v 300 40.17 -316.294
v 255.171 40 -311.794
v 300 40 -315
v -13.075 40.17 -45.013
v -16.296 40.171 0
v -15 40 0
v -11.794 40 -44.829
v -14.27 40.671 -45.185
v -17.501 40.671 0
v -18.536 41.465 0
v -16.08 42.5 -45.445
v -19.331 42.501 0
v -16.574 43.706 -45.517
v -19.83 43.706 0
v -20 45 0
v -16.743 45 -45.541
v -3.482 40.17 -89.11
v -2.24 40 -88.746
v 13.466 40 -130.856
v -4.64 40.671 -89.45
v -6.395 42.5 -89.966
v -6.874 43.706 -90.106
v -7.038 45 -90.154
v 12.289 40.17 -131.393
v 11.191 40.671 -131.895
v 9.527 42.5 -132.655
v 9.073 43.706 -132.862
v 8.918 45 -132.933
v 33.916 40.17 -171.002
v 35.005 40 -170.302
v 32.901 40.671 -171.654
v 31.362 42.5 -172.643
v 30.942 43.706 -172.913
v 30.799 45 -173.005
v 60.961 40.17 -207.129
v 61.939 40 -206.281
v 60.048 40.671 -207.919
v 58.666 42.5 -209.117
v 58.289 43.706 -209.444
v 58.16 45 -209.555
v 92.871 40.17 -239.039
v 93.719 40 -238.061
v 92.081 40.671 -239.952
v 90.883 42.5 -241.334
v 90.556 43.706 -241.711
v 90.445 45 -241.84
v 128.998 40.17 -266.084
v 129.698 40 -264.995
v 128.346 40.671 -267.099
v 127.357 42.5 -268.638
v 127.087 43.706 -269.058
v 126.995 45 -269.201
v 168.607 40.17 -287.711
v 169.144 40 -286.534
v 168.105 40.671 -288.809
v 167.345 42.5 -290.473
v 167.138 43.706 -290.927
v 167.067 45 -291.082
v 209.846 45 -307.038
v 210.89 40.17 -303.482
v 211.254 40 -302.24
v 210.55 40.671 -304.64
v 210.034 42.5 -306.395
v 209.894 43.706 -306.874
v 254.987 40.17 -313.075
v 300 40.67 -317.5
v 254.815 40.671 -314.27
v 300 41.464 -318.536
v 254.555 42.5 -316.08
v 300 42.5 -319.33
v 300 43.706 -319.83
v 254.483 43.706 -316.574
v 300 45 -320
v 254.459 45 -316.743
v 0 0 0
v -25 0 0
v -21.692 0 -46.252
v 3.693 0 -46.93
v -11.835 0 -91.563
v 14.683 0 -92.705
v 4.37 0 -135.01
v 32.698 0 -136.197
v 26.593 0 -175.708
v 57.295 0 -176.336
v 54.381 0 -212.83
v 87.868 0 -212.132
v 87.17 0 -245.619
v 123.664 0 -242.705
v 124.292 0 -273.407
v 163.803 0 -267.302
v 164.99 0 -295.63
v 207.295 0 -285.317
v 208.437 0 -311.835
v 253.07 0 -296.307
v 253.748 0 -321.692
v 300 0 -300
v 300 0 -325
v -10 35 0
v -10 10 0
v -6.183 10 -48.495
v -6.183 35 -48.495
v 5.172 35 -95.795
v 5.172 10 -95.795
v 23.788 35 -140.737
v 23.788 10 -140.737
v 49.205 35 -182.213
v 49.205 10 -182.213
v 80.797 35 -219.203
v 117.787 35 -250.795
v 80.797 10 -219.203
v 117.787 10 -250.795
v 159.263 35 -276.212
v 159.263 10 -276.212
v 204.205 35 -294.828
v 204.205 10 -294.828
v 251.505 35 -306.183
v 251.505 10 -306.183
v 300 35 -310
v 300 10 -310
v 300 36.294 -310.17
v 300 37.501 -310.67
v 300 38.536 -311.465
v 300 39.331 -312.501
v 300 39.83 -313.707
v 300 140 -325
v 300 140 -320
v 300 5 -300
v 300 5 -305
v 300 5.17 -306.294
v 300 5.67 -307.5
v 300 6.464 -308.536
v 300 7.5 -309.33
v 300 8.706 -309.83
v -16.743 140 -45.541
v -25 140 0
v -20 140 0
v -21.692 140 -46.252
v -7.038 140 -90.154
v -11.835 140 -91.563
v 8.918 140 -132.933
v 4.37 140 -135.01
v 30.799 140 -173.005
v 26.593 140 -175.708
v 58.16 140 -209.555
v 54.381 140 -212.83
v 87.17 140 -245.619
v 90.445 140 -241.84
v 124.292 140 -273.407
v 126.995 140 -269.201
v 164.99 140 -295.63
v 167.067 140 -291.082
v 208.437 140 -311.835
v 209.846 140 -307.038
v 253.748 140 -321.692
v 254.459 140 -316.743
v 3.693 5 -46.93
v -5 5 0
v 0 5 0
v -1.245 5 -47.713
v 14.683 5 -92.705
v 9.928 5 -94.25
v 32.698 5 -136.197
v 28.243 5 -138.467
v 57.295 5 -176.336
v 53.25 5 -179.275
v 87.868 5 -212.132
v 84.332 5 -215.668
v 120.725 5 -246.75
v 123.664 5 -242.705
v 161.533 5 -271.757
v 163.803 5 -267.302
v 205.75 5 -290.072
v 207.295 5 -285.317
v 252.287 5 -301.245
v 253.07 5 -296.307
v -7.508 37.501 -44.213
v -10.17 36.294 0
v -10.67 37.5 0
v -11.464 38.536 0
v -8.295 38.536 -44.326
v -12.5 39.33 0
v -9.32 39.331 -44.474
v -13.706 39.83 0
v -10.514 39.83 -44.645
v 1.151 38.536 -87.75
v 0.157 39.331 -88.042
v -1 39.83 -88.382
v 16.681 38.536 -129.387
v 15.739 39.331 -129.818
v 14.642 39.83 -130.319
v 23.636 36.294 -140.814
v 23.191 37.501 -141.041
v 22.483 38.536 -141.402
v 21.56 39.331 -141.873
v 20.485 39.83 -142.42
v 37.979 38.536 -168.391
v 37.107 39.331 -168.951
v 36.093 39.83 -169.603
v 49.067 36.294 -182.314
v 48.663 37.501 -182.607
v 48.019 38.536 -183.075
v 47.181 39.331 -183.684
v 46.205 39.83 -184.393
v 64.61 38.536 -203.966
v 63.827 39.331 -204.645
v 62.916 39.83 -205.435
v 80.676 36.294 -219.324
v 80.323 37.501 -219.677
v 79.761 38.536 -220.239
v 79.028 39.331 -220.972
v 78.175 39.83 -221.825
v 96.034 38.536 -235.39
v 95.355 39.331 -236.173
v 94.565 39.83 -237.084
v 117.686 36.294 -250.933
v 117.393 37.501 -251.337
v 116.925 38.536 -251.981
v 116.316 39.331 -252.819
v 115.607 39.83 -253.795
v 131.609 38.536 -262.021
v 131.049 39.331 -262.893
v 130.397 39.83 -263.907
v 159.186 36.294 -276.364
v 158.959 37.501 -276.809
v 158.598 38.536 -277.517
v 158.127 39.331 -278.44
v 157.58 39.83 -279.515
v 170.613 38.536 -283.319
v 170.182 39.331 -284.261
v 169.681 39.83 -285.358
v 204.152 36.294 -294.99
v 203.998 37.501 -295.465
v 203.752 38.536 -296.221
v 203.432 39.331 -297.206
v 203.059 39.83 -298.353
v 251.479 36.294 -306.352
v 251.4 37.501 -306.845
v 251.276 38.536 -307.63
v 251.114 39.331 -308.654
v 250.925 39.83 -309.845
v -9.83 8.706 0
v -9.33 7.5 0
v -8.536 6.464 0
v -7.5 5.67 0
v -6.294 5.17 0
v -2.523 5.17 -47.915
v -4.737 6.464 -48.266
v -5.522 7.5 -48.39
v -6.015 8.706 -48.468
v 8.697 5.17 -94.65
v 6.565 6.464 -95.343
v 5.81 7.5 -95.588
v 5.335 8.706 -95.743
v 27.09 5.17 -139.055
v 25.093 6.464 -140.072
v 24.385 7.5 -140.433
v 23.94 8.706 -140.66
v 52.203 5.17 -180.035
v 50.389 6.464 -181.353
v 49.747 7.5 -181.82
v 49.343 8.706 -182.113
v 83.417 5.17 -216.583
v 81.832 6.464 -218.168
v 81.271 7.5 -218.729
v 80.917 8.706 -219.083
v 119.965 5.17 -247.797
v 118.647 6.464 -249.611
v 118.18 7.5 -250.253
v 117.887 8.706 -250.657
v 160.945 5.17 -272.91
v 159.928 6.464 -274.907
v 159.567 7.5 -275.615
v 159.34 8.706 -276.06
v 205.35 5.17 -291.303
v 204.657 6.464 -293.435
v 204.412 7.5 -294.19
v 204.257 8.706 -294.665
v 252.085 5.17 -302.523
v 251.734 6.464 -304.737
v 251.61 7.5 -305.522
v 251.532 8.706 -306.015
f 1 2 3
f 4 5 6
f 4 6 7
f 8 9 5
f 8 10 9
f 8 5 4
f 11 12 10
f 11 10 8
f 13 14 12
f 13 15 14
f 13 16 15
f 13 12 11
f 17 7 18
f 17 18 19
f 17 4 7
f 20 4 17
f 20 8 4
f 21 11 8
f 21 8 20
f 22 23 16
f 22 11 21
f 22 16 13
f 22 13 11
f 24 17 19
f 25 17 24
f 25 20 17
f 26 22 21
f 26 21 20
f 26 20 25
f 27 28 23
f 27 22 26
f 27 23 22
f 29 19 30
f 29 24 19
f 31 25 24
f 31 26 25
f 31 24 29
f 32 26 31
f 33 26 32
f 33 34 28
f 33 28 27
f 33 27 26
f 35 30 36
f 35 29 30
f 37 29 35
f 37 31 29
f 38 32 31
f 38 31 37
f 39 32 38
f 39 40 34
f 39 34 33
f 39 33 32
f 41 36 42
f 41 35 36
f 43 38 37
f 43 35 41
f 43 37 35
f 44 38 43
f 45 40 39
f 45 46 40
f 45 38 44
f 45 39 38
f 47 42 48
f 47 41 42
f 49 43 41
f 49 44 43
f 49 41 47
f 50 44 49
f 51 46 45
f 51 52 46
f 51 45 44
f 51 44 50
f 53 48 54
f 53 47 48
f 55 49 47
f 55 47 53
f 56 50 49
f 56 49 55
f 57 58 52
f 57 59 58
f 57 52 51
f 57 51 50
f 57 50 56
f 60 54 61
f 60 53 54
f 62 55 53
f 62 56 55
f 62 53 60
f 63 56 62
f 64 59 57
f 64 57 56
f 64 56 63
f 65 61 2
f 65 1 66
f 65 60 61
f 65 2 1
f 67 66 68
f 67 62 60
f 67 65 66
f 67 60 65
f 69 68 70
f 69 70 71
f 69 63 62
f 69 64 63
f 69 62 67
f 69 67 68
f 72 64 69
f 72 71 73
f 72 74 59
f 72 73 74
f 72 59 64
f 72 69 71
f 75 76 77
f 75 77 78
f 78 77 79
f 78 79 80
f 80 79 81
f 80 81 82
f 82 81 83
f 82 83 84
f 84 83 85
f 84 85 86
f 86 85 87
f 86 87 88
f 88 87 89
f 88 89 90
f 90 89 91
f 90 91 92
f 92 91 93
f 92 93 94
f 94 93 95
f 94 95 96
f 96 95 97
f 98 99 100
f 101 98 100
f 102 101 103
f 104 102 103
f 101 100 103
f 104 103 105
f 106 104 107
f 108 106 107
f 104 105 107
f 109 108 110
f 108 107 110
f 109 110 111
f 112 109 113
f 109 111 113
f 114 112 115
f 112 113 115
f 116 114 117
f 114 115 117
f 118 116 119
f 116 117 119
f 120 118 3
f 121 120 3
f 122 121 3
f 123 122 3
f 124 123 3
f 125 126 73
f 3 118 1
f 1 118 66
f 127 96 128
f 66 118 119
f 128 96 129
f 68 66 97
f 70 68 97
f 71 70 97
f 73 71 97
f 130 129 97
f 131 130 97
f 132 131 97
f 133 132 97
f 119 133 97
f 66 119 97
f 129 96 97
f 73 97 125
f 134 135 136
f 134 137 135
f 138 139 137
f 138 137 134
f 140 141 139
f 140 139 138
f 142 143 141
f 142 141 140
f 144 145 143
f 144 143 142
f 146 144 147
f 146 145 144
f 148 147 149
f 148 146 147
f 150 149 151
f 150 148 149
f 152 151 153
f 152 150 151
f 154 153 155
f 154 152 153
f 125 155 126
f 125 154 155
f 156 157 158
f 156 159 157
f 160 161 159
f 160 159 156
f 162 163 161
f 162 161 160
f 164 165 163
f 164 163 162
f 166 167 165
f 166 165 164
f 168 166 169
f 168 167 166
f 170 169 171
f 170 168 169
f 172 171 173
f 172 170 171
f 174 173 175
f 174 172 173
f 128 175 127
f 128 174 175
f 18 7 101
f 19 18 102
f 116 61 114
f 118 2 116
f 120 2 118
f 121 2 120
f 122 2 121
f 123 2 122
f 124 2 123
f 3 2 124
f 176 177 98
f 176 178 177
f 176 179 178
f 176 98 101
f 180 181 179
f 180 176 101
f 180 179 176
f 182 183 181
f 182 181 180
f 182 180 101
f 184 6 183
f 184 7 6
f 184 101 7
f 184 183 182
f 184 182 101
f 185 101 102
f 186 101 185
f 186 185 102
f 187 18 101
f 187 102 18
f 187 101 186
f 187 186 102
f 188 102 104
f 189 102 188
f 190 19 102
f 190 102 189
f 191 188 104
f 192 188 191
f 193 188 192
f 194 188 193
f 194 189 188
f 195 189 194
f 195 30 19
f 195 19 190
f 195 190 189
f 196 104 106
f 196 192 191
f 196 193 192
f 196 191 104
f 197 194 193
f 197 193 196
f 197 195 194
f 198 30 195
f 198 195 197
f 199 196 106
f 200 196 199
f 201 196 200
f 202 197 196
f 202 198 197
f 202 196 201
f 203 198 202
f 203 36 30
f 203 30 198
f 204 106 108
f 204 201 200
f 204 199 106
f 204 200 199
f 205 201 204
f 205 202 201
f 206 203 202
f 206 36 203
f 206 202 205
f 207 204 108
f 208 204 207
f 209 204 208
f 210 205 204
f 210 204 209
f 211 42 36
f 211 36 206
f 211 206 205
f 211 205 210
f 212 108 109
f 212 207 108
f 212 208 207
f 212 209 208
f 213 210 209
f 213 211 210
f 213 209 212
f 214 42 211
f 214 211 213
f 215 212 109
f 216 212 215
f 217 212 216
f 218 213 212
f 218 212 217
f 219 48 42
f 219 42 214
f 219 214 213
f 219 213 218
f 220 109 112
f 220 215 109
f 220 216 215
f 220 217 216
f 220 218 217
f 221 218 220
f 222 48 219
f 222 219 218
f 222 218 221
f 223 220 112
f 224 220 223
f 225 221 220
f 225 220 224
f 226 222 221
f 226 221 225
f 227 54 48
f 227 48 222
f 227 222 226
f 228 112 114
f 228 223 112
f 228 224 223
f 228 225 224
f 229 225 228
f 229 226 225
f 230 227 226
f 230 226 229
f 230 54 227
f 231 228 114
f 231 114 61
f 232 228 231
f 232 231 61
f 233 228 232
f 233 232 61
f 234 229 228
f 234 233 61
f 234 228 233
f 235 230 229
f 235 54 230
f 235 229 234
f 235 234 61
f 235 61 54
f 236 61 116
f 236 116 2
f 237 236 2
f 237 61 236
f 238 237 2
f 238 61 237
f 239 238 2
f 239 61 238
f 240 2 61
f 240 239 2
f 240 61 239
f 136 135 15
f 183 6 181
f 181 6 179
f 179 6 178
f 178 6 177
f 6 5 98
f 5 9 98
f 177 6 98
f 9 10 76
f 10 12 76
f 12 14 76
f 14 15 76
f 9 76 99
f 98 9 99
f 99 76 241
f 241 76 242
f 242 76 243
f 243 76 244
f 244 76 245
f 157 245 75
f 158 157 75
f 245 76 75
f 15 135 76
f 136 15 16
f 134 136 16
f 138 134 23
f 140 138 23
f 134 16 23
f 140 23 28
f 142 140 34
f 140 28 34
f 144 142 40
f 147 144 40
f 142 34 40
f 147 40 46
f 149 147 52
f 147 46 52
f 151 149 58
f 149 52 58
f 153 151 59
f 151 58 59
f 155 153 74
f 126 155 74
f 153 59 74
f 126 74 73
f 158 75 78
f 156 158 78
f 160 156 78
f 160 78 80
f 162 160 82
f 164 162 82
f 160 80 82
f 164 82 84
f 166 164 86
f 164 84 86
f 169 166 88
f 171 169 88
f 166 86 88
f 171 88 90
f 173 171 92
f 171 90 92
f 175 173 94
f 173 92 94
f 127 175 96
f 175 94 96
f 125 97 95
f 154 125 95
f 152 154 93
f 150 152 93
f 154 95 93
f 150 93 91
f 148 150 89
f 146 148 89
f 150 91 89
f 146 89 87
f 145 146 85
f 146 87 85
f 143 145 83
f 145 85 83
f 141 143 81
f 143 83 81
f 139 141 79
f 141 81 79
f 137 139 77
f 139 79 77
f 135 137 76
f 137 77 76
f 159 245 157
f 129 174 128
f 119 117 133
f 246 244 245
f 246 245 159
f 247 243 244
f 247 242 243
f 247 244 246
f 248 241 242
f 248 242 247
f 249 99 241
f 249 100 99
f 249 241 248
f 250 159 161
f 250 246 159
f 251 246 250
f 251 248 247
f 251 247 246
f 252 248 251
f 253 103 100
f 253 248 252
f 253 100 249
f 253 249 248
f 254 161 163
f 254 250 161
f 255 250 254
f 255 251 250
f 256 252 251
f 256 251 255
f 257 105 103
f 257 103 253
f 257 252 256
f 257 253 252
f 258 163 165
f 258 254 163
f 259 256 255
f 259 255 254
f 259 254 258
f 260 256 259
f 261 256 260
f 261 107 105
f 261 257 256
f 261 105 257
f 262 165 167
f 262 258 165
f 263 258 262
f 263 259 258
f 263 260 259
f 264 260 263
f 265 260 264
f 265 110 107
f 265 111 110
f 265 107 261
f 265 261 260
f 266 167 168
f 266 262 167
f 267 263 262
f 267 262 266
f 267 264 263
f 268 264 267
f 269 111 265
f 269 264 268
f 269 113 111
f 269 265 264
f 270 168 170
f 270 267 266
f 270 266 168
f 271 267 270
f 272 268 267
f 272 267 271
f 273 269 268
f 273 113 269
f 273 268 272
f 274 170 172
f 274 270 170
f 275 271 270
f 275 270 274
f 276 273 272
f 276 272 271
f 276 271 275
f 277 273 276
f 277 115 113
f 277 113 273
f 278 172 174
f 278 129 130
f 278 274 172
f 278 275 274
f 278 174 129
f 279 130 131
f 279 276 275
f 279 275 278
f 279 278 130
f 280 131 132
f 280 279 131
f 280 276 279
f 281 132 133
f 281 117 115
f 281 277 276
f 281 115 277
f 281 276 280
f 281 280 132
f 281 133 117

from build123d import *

# Parameters (mm, degrees)
BOTTOM_LEVEL_DEPTH = 5
MID_LEVEL_DEPTH    = 35
GUARD_RAIL_DEPTH   = 100
ROUNDING_R         = 5


with BuildPart() as part:
    # Sketch1 → Bottom level (new body)
    with BuildSketch(Plane(origin=(0, 0, 0), x_dir=(1, 0, 0), z_dir=(0, 1, 0))):
        with BuildLine():
            Line((300, 300), (300, 325))
            ThreePointArc((300, 325), (70.190296114, 229.809703886), (-25, 0))
            Line((-25, 0), (0, 0))
            ThreePointArc((0, 0), (87.867965644, 212.132034356), (300, 300))
        make_face()
    extrude(amount=BOTTOM_LEVEL_DEPTH)

    # Sketch2 → Mid level (add)
    with BuildSketch(Plane(origin=(0, 5, 0), x_dir=(1, 0, 0), z_dir=(0, 1, 0))):
        with BuildLine():
            Line((-25, 0), (-10, 0))
            ThreePointArc((-10, 0), (80.796897832, 219.203102168), (300, 310))
            Line((300, 310), (300, 325))
            ThreePointArc((300, 325), (70.190296114, 229.809703886), (-25, 0))
        make_face()
    extrude(amount=MID_LEVEL_DEPTH)

    # Sketch3 → Guard rail (add)
    with BuildSketch(Plane(origin=(0, 40, 0), x_dir=(1, 0, 0), z_dir=(0, 1, 0))):
        with BuildLine():
            Line((-25, 0), (-20, 0))
            ThreePointArc((-20, 0), (73.72583002, 226.27416998), (300, 320))
            Line((300, 320), (300, 325))
            ThreePointArc((300, 325), (70.190296114, 229.809703886), (-25, 0))
        make_face()
    extrude(amount=GUARD_RAIL_DEPTH)

    # Rounding
    rounding_edges = [part.edges().sort_by_distance(p)[0] for p in [
        (80.796897832, 5, -219.203102168),
        (80.796897832, 40, -219.203102168),
        (73.72583002, 40, -226.27416998),
    ]]
    fillet(rounding_edges, radius=ROUNDING_R - 0.0001)  # a hair under: the kernel refuses the full size


solid = part.part
